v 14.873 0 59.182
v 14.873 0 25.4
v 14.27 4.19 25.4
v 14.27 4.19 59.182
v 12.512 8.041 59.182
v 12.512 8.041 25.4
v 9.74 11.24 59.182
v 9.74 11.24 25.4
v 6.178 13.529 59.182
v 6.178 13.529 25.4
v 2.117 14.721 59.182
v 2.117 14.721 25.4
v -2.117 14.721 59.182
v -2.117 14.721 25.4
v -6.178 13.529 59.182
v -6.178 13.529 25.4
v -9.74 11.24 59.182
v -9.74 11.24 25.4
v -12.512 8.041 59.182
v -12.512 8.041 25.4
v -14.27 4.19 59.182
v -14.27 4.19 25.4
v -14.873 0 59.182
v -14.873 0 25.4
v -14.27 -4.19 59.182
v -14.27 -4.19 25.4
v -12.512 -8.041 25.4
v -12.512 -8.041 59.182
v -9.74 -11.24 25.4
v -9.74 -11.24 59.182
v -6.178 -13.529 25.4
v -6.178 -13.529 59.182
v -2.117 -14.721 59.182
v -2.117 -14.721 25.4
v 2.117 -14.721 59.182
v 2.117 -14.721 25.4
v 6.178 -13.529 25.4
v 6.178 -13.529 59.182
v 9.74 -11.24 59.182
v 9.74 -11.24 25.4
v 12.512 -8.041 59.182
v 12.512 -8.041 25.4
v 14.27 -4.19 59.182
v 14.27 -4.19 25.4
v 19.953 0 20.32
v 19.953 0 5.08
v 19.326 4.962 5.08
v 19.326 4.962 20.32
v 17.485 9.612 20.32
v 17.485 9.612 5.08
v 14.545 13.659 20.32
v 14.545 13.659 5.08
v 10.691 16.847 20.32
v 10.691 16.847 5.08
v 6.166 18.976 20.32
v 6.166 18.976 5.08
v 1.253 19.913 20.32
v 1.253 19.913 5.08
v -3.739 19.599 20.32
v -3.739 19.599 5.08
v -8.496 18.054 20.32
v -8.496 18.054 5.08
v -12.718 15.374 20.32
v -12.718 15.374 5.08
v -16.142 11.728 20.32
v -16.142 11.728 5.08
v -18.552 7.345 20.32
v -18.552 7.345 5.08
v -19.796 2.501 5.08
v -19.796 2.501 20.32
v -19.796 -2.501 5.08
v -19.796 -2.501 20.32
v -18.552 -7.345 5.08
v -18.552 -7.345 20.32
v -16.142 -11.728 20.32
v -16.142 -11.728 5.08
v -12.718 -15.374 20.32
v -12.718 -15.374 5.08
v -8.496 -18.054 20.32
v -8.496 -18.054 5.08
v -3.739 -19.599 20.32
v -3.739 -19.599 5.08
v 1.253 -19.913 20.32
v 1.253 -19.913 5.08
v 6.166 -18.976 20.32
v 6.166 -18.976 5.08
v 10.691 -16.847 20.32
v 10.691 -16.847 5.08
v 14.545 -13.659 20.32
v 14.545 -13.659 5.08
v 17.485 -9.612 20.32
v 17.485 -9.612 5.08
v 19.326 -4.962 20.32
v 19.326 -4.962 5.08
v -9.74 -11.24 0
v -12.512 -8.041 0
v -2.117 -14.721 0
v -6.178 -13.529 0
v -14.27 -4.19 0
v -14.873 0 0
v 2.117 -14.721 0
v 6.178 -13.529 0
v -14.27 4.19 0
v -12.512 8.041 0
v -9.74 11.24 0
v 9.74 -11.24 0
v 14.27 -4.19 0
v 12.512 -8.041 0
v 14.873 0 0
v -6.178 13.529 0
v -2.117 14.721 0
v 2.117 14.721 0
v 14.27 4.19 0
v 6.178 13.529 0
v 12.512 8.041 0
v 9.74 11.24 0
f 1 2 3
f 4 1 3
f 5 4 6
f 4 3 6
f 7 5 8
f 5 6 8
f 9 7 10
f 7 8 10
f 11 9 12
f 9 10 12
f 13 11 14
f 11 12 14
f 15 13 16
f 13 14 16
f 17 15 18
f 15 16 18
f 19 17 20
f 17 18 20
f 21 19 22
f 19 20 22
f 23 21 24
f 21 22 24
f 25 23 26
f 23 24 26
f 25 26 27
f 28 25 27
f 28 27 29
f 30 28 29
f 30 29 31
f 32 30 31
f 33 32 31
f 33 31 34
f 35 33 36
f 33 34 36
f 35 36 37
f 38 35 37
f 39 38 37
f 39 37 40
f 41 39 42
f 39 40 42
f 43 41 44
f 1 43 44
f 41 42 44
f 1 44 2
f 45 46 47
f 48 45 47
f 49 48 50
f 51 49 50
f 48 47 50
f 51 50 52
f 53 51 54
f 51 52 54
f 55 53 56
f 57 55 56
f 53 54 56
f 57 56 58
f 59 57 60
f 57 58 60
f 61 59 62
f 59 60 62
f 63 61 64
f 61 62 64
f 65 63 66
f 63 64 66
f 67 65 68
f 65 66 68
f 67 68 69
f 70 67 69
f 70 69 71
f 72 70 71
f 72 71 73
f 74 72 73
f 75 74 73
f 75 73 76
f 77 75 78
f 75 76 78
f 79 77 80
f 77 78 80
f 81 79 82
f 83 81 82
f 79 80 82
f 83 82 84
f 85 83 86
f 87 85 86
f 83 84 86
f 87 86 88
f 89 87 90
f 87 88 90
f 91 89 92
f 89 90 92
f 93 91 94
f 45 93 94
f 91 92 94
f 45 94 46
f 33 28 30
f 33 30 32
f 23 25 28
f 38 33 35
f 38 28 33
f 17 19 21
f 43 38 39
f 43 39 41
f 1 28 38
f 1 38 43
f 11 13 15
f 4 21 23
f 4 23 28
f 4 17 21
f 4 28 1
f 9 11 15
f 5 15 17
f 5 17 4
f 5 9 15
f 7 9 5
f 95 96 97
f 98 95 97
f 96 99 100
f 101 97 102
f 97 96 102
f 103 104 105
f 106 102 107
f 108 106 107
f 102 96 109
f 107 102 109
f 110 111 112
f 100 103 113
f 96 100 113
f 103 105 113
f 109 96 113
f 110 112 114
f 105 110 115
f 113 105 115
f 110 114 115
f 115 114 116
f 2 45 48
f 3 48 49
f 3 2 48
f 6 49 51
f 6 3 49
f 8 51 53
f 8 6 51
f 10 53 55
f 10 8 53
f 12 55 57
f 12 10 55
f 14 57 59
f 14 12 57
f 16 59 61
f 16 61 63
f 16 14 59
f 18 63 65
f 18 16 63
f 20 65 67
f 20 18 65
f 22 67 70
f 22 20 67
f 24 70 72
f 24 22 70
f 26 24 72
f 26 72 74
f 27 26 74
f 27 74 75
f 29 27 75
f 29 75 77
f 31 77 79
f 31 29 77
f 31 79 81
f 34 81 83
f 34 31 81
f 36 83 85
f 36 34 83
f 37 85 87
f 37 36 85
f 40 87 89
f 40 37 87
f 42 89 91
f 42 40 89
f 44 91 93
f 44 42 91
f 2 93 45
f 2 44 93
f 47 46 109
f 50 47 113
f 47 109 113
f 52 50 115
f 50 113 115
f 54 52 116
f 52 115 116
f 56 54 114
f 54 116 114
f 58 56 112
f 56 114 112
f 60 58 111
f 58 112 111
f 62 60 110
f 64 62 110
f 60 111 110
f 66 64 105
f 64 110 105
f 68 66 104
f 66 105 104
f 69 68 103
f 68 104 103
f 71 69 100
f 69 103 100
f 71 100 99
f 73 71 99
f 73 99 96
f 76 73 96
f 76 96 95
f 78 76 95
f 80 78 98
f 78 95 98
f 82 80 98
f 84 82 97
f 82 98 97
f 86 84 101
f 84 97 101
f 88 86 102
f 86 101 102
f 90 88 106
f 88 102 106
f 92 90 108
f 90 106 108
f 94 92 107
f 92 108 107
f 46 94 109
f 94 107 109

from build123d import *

# Parameters (mm, degrees)
F1_DEPTH = 25.4
F2_SIZE  = 5.08
F3_DEPTH = 33.782


with BuildPart() as f1:
    # F0 (on Top) → F1 (new body)
    with BuildSketch(Plane.XY):
        with BuildLine():
            ThreePointArc((-13.5880994109, 14.6109584599), (-7.9685359746, -18.2925937783), (19.9528582593, 0))
            ThreePointArc((19.9528582593, 0), (7.9685359746, 18.2925937783), (-13.5880994109, 14.6109584599))
        make_face()
    extrude(amount=F1_DEPTH)

    # F2
    f2_edges = [f1.edges().sort_by_distance(p)[0] for p in [
        (-19.952858, 0, 0),
        (19.952858, 0, 12.7),
        (-19.952858, 0, 25.4),
    ]]
    chamfer(f2_edges, length=F2_SIZE)

    # F3 (add): a face of the model
    f3_faces = [f1.faces().sort_by_distance(p)[0] for p in [
        (0, 0, 25.4),
    ]]
    extrude(f3_faces, amount=F3_DEPTH)


solid = f1.part
